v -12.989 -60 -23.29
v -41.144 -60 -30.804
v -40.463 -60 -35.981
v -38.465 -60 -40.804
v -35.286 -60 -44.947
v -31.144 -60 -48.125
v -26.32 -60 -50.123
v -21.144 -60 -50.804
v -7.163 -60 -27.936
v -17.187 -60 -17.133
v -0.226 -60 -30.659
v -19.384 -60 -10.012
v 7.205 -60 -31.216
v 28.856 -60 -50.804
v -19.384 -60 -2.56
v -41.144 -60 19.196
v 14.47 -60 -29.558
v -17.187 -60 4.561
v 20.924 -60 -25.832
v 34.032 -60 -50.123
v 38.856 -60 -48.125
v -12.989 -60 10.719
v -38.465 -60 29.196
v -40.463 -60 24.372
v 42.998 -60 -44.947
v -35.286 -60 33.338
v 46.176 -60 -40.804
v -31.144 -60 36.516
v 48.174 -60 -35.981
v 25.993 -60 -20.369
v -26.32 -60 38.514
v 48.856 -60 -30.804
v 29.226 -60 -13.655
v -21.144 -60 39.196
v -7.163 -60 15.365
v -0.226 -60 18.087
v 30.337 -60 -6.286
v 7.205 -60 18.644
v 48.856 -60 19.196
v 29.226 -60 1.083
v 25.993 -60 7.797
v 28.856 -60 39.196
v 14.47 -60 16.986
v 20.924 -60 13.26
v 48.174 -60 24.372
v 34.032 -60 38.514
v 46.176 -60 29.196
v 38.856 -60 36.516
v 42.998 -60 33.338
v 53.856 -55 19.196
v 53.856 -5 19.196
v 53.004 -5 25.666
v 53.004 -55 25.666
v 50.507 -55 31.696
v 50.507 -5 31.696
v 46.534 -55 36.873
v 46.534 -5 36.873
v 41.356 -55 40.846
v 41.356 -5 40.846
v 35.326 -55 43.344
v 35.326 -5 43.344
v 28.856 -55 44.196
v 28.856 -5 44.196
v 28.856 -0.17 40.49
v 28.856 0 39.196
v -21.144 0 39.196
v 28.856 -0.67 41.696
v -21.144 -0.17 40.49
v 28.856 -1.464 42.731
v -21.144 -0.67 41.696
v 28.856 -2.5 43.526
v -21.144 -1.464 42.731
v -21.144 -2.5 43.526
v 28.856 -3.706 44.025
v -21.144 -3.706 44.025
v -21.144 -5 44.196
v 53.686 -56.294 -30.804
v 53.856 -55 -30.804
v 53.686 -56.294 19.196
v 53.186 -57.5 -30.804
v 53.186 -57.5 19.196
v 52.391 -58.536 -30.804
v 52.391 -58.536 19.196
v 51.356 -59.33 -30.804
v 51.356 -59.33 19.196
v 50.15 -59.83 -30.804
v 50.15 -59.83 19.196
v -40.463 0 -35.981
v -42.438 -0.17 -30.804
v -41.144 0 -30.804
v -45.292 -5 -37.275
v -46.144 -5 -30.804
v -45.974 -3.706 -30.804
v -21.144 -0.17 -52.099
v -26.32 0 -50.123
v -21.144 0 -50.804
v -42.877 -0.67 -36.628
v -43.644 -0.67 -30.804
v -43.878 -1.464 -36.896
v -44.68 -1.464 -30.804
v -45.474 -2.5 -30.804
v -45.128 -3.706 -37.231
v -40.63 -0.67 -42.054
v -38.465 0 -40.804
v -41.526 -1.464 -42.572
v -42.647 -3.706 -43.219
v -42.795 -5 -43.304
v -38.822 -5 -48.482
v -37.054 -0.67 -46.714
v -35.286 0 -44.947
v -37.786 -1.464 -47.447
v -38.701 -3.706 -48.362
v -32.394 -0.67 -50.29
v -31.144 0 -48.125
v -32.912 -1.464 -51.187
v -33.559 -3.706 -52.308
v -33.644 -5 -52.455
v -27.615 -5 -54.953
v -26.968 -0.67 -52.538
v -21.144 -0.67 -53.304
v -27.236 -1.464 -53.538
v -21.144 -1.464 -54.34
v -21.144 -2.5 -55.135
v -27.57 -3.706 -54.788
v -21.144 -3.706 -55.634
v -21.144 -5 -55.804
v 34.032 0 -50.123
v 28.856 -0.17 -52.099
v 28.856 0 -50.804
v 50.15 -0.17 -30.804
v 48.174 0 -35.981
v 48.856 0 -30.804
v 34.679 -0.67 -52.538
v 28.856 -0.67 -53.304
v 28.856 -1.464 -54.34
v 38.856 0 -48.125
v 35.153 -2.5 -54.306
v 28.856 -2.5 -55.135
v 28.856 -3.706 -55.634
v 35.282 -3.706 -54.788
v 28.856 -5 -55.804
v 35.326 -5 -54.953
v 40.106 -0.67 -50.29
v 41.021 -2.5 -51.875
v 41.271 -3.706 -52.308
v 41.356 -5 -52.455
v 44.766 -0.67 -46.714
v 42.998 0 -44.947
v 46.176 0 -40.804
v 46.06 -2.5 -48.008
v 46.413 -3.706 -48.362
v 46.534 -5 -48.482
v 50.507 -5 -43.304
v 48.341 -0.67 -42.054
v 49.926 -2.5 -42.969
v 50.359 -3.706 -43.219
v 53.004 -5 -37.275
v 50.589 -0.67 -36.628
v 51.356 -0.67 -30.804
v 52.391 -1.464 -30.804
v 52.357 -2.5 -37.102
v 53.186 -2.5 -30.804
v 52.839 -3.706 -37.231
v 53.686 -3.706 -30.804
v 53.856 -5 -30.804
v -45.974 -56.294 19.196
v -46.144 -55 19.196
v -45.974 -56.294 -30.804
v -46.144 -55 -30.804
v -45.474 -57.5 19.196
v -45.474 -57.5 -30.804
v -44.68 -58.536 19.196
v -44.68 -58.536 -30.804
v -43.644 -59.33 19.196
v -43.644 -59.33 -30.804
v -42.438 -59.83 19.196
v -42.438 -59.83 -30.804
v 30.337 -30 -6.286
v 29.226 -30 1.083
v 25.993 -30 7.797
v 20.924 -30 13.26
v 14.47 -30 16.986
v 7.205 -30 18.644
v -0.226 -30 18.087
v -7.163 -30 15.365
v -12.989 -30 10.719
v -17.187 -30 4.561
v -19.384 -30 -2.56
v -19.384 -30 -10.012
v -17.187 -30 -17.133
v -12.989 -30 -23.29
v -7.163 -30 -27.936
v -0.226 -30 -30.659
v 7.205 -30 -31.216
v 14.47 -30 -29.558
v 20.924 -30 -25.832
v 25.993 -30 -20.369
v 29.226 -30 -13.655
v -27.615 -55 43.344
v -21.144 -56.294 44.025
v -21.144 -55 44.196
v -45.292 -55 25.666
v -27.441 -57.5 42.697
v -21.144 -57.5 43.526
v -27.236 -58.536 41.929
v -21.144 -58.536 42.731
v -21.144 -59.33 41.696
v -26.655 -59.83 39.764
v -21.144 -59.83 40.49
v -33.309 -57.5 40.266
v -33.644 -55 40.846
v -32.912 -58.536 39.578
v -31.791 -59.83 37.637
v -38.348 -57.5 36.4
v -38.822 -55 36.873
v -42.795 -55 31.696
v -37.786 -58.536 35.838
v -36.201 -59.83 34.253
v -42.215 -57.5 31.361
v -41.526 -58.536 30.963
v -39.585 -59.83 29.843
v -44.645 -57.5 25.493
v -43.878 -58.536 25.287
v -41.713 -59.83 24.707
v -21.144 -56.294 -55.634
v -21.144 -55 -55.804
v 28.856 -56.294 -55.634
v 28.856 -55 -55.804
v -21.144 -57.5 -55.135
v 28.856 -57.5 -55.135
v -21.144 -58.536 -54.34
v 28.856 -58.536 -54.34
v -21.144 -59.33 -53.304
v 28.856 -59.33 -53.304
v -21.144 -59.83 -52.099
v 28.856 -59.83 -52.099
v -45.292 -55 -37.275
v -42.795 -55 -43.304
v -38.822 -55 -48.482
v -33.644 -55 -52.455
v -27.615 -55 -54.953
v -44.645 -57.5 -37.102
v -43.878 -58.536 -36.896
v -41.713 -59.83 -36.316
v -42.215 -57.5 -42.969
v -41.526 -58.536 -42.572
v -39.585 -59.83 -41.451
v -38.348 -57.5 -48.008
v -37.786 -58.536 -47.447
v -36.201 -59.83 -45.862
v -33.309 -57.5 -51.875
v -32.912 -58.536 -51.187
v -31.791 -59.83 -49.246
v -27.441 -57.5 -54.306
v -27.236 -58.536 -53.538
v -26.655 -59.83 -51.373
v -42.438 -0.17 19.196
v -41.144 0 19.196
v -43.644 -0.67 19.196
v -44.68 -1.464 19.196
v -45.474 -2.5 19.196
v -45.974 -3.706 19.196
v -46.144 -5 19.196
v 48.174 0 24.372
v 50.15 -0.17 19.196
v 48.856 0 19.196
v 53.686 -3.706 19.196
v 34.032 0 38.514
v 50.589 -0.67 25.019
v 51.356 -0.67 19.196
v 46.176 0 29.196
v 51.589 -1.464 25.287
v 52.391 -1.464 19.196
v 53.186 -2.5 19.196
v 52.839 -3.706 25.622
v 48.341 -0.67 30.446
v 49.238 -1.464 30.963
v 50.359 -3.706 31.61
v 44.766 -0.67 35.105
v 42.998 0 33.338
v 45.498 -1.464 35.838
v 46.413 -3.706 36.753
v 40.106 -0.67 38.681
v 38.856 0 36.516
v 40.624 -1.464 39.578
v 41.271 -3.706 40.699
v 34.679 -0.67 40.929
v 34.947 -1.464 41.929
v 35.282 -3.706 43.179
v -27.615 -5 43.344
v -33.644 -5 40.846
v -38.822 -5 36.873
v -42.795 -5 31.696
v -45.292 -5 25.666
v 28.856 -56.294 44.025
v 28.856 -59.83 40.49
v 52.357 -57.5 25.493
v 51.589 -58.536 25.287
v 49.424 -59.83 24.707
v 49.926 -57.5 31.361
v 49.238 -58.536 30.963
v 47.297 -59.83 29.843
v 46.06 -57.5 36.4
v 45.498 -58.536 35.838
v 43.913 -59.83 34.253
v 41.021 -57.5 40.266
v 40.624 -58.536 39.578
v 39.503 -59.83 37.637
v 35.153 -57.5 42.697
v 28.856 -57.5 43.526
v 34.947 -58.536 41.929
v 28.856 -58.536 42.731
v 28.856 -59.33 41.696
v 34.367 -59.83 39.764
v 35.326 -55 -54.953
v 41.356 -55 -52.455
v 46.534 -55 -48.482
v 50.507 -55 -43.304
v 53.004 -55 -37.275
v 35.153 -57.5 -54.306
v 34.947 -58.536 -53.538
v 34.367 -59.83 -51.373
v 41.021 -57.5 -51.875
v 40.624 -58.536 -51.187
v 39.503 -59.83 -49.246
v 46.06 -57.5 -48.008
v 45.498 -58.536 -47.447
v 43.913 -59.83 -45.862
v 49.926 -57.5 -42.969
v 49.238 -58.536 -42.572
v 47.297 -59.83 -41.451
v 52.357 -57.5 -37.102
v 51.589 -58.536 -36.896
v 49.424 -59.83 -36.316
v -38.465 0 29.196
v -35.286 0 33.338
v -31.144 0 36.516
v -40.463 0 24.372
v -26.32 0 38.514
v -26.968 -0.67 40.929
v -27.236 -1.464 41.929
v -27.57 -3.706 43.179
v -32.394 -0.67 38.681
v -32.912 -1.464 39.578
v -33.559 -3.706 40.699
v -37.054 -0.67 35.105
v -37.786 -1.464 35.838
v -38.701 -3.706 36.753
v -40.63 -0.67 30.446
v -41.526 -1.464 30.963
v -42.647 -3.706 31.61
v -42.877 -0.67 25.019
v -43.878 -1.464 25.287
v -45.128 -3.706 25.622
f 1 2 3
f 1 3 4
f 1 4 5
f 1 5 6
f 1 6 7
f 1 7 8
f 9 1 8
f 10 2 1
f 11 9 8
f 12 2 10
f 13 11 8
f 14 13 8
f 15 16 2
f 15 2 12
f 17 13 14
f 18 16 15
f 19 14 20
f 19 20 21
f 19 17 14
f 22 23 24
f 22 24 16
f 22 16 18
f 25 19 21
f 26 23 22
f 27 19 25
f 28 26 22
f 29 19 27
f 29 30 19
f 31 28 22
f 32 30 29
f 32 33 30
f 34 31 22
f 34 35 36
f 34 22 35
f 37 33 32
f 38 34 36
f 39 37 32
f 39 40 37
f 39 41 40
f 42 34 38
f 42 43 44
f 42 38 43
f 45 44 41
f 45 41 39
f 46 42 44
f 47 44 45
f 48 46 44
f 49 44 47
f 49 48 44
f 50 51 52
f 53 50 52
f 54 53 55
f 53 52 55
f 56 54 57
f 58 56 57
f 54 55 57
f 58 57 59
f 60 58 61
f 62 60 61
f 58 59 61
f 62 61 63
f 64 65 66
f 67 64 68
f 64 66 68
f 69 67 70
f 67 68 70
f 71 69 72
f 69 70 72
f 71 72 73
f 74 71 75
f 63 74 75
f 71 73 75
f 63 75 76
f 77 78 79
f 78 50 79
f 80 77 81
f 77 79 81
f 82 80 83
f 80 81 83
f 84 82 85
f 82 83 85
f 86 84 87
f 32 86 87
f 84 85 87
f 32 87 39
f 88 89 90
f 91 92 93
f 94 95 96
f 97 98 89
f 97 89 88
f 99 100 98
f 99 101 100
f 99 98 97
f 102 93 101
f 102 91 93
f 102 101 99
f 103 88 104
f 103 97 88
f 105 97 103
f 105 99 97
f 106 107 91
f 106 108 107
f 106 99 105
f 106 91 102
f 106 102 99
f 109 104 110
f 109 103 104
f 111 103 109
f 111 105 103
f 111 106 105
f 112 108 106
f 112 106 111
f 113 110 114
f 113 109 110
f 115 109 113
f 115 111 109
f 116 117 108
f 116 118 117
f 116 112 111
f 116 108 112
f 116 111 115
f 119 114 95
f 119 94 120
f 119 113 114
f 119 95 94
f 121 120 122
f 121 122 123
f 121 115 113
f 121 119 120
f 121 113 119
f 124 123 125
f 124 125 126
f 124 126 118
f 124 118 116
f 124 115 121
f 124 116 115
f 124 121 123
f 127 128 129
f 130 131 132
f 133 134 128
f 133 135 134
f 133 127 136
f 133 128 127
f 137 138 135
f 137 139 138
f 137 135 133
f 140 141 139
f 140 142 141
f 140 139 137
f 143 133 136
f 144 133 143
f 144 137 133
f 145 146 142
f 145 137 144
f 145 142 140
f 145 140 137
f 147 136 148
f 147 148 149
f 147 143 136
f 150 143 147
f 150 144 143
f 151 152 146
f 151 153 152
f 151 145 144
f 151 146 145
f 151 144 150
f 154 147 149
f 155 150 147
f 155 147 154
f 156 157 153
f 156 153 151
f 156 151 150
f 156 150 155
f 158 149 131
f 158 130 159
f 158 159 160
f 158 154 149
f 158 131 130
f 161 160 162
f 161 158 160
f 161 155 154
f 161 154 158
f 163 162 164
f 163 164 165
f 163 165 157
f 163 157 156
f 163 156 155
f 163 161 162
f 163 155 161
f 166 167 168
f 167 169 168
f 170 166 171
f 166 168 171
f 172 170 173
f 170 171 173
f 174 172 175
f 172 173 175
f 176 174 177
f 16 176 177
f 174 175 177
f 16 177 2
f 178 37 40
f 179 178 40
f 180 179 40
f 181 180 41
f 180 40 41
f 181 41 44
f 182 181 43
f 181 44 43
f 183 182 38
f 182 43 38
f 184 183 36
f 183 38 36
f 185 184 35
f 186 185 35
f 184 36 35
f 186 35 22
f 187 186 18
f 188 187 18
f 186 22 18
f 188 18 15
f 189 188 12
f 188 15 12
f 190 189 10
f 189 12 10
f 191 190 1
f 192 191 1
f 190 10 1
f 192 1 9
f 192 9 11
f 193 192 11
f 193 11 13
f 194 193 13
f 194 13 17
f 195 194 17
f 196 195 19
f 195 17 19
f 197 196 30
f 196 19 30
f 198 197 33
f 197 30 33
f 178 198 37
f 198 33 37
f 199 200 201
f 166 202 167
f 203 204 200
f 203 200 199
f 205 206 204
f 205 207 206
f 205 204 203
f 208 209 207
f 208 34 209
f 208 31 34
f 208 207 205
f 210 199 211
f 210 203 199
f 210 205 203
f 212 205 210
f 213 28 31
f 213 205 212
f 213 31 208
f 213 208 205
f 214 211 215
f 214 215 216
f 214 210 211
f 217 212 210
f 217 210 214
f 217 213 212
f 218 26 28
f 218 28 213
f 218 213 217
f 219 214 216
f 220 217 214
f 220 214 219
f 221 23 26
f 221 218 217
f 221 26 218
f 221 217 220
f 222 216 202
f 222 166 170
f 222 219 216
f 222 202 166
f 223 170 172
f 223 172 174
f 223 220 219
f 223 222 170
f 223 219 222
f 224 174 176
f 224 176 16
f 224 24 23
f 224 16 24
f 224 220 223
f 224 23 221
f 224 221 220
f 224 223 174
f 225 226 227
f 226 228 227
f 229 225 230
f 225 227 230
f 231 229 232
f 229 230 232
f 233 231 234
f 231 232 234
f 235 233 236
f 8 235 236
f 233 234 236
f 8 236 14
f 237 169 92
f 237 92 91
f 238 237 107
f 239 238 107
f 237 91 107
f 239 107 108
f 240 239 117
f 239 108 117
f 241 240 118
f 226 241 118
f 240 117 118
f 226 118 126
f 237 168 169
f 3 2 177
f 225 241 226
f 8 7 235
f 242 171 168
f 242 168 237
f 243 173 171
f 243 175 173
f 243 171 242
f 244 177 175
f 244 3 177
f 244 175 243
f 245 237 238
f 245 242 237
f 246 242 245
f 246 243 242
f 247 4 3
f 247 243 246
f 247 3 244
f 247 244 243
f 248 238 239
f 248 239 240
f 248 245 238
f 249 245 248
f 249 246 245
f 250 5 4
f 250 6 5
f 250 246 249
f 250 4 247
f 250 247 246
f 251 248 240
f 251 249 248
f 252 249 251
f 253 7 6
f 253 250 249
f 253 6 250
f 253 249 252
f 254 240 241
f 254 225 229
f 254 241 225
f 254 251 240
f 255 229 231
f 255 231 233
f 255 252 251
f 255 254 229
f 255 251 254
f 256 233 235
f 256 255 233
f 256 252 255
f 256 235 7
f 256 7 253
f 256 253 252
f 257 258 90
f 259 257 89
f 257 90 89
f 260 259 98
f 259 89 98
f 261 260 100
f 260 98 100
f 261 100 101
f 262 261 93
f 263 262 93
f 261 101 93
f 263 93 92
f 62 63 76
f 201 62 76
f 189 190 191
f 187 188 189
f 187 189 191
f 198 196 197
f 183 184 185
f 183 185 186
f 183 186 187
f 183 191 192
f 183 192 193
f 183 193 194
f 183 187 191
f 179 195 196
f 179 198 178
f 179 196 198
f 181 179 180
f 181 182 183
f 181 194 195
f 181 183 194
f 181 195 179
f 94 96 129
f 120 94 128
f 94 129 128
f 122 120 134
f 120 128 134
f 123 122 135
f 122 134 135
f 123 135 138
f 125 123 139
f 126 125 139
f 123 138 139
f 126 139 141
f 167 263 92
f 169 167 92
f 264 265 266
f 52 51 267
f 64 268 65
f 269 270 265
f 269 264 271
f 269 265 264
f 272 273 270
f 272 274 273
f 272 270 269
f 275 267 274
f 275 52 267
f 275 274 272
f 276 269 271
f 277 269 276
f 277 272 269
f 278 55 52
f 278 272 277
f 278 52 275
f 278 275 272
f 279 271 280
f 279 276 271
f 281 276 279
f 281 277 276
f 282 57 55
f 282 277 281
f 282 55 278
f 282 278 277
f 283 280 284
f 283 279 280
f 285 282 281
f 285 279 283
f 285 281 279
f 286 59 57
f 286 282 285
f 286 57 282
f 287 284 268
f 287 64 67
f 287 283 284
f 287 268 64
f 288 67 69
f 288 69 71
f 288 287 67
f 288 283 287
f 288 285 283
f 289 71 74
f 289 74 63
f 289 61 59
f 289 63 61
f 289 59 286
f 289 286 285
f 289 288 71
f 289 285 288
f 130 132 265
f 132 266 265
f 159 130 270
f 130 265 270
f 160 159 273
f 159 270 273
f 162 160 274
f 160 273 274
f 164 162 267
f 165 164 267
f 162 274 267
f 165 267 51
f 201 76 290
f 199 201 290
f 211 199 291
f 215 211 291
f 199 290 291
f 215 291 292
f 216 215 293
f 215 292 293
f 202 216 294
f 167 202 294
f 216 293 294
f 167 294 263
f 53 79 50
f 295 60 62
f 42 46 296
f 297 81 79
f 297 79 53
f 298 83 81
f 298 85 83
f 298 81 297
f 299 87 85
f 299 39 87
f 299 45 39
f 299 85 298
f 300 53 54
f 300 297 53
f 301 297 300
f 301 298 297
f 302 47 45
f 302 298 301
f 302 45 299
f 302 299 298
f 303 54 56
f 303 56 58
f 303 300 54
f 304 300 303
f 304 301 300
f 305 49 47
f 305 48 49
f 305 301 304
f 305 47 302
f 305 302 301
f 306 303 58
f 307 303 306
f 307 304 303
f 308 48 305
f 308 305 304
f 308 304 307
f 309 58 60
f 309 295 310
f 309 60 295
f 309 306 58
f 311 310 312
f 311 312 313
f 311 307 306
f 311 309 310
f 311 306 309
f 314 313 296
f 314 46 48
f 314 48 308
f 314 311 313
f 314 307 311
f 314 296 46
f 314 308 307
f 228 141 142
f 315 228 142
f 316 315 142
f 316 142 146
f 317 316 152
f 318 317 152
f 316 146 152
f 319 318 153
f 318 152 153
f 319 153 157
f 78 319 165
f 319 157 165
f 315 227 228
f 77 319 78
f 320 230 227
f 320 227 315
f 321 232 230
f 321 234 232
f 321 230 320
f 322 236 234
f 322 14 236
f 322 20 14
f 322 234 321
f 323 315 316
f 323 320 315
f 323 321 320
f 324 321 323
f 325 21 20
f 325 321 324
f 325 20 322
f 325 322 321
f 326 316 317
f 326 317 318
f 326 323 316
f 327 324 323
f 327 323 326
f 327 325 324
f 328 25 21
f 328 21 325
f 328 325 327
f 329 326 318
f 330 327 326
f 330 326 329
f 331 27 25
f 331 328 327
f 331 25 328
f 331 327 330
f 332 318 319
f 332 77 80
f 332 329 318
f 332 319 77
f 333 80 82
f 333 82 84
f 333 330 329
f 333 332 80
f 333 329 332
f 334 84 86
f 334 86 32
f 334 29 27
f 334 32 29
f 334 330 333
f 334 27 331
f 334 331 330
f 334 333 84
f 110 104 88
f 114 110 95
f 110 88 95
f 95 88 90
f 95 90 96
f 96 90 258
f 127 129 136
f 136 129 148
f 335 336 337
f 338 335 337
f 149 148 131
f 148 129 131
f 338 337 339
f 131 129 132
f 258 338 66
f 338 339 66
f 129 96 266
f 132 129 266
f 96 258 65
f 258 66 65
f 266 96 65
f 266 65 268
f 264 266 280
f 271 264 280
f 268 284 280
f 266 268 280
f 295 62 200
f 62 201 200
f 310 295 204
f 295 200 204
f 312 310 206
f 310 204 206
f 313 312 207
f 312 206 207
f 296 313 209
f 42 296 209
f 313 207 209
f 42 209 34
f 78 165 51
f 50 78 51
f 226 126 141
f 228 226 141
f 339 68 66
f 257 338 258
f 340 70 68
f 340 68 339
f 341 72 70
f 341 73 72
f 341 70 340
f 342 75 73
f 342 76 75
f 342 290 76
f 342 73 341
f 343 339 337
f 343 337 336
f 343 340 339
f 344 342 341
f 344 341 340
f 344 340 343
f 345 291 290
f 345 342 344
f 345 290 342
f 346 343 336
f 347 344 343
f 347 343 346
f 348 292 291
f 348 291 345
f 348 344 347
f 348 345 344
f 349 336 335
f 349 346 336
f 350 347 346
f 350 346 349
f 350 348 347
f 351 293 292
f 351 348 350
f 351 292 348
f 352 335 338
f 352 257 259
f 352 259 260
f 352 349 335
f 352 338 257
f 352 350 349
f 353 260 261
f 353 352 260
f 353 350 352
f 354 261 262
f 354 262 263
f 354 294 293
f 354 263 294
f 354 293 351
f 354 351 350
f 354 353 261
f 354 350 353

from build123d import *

# Parameters (mm, degrees)
F1_DEPTH = 60
F2_R     = 5
F3_R     = 5
F5_R     = 25
F6_DEPTH = 30
F7_R     = 25
F8_DEPTH = 30


with BuildPart() as f1:
    # F0 (on Front) → F1 (new body)
    with BuildSketch(Plane.XZ):
        with BuildLine():
            Line((28.855905, 44.195566), (-21.144095, 44.195566))
            ThreePointArc((-21.144095, 44.195566), (-38.821765, 36.873235), (-46.144095, 19.195566))
            Line((-46.144095, 19.195566), (-46.144095, 13.908361))
            Line((-46.144095, 13.908361), (-46.144095, 9.730815))
            Line((-46.144095, 9.730815), (-46.144095, -30.804434))
            ThreePointArc((-46.144095, -30.804434), (-38.821765, -48.482104), (-21.144095, -55.804434))
            Line((-21.144095, -55.804434), (28.855905, -55.804434))
            ThreePointArc((28.855905, -55.804434), (46.533574, -48.482104), (53.855905, -30.804434))
            Line((53.855905, -30.804434), (53.855905, 19.195566))
            ThreePointArc((53.855905, 19.195566), (46.533574, 36.873235), (28.855905, 44.195566))
        make_face()
    extrude(amount=F1_DEPTH)

    # F2
    f2_edges = [f1.edges().sort_by_distance(p)[0] for p in [
        (-38.821765, -60, 36.873235),
        (3.855905, -60, 44.195566),
        (-46.144095, -60, -5.804434),
        (-38.821765, -60, -48.482104),
        (3.855905, -60, -55.804434),
        (46.533574, -60, -48.482104),
        (53.855905, -60, -5.804434),
        (46.533574, -60, 36.873235),
    ]]
    fillet(f2_edges, radius=F2_R)

    # F3
    f3_edges = [f1.edges().sort_by_distance(p)[0] for p in [
        (53.855905, 0, -5.804434),
        (3.855905, 0, 44.195566),
        (-38.821765, 0, 36.873235),
        (-46.144095, 0, -5.804434),
        (-38.821765, 0, -48.482104),
        (3.855905, 0, -55.804434),
        (46.533574, 0, -48.482104),
        (46.533574, 0, 36.873235),
    ]]
    fillet(f3_edges, radius=F3_R)

    # F5 (on Front) → F6 (cut)
    with BuildSketch(Plane.XZ):
        Circle(F5_R)
    extrude(amount=-F6_DEPTH, mode=Mode.SUBTRACT)

    # F7 (on face) → F8 (cut)
    with BuildSketch(Plane.XZ.offset(60)):
        with Locations((5.336974, -6.285768)):
            Circle(F7_R)
    extrude(amount=-F8_DEPTH, mode=Mode.SUBTRACT)


solid = f1.part
